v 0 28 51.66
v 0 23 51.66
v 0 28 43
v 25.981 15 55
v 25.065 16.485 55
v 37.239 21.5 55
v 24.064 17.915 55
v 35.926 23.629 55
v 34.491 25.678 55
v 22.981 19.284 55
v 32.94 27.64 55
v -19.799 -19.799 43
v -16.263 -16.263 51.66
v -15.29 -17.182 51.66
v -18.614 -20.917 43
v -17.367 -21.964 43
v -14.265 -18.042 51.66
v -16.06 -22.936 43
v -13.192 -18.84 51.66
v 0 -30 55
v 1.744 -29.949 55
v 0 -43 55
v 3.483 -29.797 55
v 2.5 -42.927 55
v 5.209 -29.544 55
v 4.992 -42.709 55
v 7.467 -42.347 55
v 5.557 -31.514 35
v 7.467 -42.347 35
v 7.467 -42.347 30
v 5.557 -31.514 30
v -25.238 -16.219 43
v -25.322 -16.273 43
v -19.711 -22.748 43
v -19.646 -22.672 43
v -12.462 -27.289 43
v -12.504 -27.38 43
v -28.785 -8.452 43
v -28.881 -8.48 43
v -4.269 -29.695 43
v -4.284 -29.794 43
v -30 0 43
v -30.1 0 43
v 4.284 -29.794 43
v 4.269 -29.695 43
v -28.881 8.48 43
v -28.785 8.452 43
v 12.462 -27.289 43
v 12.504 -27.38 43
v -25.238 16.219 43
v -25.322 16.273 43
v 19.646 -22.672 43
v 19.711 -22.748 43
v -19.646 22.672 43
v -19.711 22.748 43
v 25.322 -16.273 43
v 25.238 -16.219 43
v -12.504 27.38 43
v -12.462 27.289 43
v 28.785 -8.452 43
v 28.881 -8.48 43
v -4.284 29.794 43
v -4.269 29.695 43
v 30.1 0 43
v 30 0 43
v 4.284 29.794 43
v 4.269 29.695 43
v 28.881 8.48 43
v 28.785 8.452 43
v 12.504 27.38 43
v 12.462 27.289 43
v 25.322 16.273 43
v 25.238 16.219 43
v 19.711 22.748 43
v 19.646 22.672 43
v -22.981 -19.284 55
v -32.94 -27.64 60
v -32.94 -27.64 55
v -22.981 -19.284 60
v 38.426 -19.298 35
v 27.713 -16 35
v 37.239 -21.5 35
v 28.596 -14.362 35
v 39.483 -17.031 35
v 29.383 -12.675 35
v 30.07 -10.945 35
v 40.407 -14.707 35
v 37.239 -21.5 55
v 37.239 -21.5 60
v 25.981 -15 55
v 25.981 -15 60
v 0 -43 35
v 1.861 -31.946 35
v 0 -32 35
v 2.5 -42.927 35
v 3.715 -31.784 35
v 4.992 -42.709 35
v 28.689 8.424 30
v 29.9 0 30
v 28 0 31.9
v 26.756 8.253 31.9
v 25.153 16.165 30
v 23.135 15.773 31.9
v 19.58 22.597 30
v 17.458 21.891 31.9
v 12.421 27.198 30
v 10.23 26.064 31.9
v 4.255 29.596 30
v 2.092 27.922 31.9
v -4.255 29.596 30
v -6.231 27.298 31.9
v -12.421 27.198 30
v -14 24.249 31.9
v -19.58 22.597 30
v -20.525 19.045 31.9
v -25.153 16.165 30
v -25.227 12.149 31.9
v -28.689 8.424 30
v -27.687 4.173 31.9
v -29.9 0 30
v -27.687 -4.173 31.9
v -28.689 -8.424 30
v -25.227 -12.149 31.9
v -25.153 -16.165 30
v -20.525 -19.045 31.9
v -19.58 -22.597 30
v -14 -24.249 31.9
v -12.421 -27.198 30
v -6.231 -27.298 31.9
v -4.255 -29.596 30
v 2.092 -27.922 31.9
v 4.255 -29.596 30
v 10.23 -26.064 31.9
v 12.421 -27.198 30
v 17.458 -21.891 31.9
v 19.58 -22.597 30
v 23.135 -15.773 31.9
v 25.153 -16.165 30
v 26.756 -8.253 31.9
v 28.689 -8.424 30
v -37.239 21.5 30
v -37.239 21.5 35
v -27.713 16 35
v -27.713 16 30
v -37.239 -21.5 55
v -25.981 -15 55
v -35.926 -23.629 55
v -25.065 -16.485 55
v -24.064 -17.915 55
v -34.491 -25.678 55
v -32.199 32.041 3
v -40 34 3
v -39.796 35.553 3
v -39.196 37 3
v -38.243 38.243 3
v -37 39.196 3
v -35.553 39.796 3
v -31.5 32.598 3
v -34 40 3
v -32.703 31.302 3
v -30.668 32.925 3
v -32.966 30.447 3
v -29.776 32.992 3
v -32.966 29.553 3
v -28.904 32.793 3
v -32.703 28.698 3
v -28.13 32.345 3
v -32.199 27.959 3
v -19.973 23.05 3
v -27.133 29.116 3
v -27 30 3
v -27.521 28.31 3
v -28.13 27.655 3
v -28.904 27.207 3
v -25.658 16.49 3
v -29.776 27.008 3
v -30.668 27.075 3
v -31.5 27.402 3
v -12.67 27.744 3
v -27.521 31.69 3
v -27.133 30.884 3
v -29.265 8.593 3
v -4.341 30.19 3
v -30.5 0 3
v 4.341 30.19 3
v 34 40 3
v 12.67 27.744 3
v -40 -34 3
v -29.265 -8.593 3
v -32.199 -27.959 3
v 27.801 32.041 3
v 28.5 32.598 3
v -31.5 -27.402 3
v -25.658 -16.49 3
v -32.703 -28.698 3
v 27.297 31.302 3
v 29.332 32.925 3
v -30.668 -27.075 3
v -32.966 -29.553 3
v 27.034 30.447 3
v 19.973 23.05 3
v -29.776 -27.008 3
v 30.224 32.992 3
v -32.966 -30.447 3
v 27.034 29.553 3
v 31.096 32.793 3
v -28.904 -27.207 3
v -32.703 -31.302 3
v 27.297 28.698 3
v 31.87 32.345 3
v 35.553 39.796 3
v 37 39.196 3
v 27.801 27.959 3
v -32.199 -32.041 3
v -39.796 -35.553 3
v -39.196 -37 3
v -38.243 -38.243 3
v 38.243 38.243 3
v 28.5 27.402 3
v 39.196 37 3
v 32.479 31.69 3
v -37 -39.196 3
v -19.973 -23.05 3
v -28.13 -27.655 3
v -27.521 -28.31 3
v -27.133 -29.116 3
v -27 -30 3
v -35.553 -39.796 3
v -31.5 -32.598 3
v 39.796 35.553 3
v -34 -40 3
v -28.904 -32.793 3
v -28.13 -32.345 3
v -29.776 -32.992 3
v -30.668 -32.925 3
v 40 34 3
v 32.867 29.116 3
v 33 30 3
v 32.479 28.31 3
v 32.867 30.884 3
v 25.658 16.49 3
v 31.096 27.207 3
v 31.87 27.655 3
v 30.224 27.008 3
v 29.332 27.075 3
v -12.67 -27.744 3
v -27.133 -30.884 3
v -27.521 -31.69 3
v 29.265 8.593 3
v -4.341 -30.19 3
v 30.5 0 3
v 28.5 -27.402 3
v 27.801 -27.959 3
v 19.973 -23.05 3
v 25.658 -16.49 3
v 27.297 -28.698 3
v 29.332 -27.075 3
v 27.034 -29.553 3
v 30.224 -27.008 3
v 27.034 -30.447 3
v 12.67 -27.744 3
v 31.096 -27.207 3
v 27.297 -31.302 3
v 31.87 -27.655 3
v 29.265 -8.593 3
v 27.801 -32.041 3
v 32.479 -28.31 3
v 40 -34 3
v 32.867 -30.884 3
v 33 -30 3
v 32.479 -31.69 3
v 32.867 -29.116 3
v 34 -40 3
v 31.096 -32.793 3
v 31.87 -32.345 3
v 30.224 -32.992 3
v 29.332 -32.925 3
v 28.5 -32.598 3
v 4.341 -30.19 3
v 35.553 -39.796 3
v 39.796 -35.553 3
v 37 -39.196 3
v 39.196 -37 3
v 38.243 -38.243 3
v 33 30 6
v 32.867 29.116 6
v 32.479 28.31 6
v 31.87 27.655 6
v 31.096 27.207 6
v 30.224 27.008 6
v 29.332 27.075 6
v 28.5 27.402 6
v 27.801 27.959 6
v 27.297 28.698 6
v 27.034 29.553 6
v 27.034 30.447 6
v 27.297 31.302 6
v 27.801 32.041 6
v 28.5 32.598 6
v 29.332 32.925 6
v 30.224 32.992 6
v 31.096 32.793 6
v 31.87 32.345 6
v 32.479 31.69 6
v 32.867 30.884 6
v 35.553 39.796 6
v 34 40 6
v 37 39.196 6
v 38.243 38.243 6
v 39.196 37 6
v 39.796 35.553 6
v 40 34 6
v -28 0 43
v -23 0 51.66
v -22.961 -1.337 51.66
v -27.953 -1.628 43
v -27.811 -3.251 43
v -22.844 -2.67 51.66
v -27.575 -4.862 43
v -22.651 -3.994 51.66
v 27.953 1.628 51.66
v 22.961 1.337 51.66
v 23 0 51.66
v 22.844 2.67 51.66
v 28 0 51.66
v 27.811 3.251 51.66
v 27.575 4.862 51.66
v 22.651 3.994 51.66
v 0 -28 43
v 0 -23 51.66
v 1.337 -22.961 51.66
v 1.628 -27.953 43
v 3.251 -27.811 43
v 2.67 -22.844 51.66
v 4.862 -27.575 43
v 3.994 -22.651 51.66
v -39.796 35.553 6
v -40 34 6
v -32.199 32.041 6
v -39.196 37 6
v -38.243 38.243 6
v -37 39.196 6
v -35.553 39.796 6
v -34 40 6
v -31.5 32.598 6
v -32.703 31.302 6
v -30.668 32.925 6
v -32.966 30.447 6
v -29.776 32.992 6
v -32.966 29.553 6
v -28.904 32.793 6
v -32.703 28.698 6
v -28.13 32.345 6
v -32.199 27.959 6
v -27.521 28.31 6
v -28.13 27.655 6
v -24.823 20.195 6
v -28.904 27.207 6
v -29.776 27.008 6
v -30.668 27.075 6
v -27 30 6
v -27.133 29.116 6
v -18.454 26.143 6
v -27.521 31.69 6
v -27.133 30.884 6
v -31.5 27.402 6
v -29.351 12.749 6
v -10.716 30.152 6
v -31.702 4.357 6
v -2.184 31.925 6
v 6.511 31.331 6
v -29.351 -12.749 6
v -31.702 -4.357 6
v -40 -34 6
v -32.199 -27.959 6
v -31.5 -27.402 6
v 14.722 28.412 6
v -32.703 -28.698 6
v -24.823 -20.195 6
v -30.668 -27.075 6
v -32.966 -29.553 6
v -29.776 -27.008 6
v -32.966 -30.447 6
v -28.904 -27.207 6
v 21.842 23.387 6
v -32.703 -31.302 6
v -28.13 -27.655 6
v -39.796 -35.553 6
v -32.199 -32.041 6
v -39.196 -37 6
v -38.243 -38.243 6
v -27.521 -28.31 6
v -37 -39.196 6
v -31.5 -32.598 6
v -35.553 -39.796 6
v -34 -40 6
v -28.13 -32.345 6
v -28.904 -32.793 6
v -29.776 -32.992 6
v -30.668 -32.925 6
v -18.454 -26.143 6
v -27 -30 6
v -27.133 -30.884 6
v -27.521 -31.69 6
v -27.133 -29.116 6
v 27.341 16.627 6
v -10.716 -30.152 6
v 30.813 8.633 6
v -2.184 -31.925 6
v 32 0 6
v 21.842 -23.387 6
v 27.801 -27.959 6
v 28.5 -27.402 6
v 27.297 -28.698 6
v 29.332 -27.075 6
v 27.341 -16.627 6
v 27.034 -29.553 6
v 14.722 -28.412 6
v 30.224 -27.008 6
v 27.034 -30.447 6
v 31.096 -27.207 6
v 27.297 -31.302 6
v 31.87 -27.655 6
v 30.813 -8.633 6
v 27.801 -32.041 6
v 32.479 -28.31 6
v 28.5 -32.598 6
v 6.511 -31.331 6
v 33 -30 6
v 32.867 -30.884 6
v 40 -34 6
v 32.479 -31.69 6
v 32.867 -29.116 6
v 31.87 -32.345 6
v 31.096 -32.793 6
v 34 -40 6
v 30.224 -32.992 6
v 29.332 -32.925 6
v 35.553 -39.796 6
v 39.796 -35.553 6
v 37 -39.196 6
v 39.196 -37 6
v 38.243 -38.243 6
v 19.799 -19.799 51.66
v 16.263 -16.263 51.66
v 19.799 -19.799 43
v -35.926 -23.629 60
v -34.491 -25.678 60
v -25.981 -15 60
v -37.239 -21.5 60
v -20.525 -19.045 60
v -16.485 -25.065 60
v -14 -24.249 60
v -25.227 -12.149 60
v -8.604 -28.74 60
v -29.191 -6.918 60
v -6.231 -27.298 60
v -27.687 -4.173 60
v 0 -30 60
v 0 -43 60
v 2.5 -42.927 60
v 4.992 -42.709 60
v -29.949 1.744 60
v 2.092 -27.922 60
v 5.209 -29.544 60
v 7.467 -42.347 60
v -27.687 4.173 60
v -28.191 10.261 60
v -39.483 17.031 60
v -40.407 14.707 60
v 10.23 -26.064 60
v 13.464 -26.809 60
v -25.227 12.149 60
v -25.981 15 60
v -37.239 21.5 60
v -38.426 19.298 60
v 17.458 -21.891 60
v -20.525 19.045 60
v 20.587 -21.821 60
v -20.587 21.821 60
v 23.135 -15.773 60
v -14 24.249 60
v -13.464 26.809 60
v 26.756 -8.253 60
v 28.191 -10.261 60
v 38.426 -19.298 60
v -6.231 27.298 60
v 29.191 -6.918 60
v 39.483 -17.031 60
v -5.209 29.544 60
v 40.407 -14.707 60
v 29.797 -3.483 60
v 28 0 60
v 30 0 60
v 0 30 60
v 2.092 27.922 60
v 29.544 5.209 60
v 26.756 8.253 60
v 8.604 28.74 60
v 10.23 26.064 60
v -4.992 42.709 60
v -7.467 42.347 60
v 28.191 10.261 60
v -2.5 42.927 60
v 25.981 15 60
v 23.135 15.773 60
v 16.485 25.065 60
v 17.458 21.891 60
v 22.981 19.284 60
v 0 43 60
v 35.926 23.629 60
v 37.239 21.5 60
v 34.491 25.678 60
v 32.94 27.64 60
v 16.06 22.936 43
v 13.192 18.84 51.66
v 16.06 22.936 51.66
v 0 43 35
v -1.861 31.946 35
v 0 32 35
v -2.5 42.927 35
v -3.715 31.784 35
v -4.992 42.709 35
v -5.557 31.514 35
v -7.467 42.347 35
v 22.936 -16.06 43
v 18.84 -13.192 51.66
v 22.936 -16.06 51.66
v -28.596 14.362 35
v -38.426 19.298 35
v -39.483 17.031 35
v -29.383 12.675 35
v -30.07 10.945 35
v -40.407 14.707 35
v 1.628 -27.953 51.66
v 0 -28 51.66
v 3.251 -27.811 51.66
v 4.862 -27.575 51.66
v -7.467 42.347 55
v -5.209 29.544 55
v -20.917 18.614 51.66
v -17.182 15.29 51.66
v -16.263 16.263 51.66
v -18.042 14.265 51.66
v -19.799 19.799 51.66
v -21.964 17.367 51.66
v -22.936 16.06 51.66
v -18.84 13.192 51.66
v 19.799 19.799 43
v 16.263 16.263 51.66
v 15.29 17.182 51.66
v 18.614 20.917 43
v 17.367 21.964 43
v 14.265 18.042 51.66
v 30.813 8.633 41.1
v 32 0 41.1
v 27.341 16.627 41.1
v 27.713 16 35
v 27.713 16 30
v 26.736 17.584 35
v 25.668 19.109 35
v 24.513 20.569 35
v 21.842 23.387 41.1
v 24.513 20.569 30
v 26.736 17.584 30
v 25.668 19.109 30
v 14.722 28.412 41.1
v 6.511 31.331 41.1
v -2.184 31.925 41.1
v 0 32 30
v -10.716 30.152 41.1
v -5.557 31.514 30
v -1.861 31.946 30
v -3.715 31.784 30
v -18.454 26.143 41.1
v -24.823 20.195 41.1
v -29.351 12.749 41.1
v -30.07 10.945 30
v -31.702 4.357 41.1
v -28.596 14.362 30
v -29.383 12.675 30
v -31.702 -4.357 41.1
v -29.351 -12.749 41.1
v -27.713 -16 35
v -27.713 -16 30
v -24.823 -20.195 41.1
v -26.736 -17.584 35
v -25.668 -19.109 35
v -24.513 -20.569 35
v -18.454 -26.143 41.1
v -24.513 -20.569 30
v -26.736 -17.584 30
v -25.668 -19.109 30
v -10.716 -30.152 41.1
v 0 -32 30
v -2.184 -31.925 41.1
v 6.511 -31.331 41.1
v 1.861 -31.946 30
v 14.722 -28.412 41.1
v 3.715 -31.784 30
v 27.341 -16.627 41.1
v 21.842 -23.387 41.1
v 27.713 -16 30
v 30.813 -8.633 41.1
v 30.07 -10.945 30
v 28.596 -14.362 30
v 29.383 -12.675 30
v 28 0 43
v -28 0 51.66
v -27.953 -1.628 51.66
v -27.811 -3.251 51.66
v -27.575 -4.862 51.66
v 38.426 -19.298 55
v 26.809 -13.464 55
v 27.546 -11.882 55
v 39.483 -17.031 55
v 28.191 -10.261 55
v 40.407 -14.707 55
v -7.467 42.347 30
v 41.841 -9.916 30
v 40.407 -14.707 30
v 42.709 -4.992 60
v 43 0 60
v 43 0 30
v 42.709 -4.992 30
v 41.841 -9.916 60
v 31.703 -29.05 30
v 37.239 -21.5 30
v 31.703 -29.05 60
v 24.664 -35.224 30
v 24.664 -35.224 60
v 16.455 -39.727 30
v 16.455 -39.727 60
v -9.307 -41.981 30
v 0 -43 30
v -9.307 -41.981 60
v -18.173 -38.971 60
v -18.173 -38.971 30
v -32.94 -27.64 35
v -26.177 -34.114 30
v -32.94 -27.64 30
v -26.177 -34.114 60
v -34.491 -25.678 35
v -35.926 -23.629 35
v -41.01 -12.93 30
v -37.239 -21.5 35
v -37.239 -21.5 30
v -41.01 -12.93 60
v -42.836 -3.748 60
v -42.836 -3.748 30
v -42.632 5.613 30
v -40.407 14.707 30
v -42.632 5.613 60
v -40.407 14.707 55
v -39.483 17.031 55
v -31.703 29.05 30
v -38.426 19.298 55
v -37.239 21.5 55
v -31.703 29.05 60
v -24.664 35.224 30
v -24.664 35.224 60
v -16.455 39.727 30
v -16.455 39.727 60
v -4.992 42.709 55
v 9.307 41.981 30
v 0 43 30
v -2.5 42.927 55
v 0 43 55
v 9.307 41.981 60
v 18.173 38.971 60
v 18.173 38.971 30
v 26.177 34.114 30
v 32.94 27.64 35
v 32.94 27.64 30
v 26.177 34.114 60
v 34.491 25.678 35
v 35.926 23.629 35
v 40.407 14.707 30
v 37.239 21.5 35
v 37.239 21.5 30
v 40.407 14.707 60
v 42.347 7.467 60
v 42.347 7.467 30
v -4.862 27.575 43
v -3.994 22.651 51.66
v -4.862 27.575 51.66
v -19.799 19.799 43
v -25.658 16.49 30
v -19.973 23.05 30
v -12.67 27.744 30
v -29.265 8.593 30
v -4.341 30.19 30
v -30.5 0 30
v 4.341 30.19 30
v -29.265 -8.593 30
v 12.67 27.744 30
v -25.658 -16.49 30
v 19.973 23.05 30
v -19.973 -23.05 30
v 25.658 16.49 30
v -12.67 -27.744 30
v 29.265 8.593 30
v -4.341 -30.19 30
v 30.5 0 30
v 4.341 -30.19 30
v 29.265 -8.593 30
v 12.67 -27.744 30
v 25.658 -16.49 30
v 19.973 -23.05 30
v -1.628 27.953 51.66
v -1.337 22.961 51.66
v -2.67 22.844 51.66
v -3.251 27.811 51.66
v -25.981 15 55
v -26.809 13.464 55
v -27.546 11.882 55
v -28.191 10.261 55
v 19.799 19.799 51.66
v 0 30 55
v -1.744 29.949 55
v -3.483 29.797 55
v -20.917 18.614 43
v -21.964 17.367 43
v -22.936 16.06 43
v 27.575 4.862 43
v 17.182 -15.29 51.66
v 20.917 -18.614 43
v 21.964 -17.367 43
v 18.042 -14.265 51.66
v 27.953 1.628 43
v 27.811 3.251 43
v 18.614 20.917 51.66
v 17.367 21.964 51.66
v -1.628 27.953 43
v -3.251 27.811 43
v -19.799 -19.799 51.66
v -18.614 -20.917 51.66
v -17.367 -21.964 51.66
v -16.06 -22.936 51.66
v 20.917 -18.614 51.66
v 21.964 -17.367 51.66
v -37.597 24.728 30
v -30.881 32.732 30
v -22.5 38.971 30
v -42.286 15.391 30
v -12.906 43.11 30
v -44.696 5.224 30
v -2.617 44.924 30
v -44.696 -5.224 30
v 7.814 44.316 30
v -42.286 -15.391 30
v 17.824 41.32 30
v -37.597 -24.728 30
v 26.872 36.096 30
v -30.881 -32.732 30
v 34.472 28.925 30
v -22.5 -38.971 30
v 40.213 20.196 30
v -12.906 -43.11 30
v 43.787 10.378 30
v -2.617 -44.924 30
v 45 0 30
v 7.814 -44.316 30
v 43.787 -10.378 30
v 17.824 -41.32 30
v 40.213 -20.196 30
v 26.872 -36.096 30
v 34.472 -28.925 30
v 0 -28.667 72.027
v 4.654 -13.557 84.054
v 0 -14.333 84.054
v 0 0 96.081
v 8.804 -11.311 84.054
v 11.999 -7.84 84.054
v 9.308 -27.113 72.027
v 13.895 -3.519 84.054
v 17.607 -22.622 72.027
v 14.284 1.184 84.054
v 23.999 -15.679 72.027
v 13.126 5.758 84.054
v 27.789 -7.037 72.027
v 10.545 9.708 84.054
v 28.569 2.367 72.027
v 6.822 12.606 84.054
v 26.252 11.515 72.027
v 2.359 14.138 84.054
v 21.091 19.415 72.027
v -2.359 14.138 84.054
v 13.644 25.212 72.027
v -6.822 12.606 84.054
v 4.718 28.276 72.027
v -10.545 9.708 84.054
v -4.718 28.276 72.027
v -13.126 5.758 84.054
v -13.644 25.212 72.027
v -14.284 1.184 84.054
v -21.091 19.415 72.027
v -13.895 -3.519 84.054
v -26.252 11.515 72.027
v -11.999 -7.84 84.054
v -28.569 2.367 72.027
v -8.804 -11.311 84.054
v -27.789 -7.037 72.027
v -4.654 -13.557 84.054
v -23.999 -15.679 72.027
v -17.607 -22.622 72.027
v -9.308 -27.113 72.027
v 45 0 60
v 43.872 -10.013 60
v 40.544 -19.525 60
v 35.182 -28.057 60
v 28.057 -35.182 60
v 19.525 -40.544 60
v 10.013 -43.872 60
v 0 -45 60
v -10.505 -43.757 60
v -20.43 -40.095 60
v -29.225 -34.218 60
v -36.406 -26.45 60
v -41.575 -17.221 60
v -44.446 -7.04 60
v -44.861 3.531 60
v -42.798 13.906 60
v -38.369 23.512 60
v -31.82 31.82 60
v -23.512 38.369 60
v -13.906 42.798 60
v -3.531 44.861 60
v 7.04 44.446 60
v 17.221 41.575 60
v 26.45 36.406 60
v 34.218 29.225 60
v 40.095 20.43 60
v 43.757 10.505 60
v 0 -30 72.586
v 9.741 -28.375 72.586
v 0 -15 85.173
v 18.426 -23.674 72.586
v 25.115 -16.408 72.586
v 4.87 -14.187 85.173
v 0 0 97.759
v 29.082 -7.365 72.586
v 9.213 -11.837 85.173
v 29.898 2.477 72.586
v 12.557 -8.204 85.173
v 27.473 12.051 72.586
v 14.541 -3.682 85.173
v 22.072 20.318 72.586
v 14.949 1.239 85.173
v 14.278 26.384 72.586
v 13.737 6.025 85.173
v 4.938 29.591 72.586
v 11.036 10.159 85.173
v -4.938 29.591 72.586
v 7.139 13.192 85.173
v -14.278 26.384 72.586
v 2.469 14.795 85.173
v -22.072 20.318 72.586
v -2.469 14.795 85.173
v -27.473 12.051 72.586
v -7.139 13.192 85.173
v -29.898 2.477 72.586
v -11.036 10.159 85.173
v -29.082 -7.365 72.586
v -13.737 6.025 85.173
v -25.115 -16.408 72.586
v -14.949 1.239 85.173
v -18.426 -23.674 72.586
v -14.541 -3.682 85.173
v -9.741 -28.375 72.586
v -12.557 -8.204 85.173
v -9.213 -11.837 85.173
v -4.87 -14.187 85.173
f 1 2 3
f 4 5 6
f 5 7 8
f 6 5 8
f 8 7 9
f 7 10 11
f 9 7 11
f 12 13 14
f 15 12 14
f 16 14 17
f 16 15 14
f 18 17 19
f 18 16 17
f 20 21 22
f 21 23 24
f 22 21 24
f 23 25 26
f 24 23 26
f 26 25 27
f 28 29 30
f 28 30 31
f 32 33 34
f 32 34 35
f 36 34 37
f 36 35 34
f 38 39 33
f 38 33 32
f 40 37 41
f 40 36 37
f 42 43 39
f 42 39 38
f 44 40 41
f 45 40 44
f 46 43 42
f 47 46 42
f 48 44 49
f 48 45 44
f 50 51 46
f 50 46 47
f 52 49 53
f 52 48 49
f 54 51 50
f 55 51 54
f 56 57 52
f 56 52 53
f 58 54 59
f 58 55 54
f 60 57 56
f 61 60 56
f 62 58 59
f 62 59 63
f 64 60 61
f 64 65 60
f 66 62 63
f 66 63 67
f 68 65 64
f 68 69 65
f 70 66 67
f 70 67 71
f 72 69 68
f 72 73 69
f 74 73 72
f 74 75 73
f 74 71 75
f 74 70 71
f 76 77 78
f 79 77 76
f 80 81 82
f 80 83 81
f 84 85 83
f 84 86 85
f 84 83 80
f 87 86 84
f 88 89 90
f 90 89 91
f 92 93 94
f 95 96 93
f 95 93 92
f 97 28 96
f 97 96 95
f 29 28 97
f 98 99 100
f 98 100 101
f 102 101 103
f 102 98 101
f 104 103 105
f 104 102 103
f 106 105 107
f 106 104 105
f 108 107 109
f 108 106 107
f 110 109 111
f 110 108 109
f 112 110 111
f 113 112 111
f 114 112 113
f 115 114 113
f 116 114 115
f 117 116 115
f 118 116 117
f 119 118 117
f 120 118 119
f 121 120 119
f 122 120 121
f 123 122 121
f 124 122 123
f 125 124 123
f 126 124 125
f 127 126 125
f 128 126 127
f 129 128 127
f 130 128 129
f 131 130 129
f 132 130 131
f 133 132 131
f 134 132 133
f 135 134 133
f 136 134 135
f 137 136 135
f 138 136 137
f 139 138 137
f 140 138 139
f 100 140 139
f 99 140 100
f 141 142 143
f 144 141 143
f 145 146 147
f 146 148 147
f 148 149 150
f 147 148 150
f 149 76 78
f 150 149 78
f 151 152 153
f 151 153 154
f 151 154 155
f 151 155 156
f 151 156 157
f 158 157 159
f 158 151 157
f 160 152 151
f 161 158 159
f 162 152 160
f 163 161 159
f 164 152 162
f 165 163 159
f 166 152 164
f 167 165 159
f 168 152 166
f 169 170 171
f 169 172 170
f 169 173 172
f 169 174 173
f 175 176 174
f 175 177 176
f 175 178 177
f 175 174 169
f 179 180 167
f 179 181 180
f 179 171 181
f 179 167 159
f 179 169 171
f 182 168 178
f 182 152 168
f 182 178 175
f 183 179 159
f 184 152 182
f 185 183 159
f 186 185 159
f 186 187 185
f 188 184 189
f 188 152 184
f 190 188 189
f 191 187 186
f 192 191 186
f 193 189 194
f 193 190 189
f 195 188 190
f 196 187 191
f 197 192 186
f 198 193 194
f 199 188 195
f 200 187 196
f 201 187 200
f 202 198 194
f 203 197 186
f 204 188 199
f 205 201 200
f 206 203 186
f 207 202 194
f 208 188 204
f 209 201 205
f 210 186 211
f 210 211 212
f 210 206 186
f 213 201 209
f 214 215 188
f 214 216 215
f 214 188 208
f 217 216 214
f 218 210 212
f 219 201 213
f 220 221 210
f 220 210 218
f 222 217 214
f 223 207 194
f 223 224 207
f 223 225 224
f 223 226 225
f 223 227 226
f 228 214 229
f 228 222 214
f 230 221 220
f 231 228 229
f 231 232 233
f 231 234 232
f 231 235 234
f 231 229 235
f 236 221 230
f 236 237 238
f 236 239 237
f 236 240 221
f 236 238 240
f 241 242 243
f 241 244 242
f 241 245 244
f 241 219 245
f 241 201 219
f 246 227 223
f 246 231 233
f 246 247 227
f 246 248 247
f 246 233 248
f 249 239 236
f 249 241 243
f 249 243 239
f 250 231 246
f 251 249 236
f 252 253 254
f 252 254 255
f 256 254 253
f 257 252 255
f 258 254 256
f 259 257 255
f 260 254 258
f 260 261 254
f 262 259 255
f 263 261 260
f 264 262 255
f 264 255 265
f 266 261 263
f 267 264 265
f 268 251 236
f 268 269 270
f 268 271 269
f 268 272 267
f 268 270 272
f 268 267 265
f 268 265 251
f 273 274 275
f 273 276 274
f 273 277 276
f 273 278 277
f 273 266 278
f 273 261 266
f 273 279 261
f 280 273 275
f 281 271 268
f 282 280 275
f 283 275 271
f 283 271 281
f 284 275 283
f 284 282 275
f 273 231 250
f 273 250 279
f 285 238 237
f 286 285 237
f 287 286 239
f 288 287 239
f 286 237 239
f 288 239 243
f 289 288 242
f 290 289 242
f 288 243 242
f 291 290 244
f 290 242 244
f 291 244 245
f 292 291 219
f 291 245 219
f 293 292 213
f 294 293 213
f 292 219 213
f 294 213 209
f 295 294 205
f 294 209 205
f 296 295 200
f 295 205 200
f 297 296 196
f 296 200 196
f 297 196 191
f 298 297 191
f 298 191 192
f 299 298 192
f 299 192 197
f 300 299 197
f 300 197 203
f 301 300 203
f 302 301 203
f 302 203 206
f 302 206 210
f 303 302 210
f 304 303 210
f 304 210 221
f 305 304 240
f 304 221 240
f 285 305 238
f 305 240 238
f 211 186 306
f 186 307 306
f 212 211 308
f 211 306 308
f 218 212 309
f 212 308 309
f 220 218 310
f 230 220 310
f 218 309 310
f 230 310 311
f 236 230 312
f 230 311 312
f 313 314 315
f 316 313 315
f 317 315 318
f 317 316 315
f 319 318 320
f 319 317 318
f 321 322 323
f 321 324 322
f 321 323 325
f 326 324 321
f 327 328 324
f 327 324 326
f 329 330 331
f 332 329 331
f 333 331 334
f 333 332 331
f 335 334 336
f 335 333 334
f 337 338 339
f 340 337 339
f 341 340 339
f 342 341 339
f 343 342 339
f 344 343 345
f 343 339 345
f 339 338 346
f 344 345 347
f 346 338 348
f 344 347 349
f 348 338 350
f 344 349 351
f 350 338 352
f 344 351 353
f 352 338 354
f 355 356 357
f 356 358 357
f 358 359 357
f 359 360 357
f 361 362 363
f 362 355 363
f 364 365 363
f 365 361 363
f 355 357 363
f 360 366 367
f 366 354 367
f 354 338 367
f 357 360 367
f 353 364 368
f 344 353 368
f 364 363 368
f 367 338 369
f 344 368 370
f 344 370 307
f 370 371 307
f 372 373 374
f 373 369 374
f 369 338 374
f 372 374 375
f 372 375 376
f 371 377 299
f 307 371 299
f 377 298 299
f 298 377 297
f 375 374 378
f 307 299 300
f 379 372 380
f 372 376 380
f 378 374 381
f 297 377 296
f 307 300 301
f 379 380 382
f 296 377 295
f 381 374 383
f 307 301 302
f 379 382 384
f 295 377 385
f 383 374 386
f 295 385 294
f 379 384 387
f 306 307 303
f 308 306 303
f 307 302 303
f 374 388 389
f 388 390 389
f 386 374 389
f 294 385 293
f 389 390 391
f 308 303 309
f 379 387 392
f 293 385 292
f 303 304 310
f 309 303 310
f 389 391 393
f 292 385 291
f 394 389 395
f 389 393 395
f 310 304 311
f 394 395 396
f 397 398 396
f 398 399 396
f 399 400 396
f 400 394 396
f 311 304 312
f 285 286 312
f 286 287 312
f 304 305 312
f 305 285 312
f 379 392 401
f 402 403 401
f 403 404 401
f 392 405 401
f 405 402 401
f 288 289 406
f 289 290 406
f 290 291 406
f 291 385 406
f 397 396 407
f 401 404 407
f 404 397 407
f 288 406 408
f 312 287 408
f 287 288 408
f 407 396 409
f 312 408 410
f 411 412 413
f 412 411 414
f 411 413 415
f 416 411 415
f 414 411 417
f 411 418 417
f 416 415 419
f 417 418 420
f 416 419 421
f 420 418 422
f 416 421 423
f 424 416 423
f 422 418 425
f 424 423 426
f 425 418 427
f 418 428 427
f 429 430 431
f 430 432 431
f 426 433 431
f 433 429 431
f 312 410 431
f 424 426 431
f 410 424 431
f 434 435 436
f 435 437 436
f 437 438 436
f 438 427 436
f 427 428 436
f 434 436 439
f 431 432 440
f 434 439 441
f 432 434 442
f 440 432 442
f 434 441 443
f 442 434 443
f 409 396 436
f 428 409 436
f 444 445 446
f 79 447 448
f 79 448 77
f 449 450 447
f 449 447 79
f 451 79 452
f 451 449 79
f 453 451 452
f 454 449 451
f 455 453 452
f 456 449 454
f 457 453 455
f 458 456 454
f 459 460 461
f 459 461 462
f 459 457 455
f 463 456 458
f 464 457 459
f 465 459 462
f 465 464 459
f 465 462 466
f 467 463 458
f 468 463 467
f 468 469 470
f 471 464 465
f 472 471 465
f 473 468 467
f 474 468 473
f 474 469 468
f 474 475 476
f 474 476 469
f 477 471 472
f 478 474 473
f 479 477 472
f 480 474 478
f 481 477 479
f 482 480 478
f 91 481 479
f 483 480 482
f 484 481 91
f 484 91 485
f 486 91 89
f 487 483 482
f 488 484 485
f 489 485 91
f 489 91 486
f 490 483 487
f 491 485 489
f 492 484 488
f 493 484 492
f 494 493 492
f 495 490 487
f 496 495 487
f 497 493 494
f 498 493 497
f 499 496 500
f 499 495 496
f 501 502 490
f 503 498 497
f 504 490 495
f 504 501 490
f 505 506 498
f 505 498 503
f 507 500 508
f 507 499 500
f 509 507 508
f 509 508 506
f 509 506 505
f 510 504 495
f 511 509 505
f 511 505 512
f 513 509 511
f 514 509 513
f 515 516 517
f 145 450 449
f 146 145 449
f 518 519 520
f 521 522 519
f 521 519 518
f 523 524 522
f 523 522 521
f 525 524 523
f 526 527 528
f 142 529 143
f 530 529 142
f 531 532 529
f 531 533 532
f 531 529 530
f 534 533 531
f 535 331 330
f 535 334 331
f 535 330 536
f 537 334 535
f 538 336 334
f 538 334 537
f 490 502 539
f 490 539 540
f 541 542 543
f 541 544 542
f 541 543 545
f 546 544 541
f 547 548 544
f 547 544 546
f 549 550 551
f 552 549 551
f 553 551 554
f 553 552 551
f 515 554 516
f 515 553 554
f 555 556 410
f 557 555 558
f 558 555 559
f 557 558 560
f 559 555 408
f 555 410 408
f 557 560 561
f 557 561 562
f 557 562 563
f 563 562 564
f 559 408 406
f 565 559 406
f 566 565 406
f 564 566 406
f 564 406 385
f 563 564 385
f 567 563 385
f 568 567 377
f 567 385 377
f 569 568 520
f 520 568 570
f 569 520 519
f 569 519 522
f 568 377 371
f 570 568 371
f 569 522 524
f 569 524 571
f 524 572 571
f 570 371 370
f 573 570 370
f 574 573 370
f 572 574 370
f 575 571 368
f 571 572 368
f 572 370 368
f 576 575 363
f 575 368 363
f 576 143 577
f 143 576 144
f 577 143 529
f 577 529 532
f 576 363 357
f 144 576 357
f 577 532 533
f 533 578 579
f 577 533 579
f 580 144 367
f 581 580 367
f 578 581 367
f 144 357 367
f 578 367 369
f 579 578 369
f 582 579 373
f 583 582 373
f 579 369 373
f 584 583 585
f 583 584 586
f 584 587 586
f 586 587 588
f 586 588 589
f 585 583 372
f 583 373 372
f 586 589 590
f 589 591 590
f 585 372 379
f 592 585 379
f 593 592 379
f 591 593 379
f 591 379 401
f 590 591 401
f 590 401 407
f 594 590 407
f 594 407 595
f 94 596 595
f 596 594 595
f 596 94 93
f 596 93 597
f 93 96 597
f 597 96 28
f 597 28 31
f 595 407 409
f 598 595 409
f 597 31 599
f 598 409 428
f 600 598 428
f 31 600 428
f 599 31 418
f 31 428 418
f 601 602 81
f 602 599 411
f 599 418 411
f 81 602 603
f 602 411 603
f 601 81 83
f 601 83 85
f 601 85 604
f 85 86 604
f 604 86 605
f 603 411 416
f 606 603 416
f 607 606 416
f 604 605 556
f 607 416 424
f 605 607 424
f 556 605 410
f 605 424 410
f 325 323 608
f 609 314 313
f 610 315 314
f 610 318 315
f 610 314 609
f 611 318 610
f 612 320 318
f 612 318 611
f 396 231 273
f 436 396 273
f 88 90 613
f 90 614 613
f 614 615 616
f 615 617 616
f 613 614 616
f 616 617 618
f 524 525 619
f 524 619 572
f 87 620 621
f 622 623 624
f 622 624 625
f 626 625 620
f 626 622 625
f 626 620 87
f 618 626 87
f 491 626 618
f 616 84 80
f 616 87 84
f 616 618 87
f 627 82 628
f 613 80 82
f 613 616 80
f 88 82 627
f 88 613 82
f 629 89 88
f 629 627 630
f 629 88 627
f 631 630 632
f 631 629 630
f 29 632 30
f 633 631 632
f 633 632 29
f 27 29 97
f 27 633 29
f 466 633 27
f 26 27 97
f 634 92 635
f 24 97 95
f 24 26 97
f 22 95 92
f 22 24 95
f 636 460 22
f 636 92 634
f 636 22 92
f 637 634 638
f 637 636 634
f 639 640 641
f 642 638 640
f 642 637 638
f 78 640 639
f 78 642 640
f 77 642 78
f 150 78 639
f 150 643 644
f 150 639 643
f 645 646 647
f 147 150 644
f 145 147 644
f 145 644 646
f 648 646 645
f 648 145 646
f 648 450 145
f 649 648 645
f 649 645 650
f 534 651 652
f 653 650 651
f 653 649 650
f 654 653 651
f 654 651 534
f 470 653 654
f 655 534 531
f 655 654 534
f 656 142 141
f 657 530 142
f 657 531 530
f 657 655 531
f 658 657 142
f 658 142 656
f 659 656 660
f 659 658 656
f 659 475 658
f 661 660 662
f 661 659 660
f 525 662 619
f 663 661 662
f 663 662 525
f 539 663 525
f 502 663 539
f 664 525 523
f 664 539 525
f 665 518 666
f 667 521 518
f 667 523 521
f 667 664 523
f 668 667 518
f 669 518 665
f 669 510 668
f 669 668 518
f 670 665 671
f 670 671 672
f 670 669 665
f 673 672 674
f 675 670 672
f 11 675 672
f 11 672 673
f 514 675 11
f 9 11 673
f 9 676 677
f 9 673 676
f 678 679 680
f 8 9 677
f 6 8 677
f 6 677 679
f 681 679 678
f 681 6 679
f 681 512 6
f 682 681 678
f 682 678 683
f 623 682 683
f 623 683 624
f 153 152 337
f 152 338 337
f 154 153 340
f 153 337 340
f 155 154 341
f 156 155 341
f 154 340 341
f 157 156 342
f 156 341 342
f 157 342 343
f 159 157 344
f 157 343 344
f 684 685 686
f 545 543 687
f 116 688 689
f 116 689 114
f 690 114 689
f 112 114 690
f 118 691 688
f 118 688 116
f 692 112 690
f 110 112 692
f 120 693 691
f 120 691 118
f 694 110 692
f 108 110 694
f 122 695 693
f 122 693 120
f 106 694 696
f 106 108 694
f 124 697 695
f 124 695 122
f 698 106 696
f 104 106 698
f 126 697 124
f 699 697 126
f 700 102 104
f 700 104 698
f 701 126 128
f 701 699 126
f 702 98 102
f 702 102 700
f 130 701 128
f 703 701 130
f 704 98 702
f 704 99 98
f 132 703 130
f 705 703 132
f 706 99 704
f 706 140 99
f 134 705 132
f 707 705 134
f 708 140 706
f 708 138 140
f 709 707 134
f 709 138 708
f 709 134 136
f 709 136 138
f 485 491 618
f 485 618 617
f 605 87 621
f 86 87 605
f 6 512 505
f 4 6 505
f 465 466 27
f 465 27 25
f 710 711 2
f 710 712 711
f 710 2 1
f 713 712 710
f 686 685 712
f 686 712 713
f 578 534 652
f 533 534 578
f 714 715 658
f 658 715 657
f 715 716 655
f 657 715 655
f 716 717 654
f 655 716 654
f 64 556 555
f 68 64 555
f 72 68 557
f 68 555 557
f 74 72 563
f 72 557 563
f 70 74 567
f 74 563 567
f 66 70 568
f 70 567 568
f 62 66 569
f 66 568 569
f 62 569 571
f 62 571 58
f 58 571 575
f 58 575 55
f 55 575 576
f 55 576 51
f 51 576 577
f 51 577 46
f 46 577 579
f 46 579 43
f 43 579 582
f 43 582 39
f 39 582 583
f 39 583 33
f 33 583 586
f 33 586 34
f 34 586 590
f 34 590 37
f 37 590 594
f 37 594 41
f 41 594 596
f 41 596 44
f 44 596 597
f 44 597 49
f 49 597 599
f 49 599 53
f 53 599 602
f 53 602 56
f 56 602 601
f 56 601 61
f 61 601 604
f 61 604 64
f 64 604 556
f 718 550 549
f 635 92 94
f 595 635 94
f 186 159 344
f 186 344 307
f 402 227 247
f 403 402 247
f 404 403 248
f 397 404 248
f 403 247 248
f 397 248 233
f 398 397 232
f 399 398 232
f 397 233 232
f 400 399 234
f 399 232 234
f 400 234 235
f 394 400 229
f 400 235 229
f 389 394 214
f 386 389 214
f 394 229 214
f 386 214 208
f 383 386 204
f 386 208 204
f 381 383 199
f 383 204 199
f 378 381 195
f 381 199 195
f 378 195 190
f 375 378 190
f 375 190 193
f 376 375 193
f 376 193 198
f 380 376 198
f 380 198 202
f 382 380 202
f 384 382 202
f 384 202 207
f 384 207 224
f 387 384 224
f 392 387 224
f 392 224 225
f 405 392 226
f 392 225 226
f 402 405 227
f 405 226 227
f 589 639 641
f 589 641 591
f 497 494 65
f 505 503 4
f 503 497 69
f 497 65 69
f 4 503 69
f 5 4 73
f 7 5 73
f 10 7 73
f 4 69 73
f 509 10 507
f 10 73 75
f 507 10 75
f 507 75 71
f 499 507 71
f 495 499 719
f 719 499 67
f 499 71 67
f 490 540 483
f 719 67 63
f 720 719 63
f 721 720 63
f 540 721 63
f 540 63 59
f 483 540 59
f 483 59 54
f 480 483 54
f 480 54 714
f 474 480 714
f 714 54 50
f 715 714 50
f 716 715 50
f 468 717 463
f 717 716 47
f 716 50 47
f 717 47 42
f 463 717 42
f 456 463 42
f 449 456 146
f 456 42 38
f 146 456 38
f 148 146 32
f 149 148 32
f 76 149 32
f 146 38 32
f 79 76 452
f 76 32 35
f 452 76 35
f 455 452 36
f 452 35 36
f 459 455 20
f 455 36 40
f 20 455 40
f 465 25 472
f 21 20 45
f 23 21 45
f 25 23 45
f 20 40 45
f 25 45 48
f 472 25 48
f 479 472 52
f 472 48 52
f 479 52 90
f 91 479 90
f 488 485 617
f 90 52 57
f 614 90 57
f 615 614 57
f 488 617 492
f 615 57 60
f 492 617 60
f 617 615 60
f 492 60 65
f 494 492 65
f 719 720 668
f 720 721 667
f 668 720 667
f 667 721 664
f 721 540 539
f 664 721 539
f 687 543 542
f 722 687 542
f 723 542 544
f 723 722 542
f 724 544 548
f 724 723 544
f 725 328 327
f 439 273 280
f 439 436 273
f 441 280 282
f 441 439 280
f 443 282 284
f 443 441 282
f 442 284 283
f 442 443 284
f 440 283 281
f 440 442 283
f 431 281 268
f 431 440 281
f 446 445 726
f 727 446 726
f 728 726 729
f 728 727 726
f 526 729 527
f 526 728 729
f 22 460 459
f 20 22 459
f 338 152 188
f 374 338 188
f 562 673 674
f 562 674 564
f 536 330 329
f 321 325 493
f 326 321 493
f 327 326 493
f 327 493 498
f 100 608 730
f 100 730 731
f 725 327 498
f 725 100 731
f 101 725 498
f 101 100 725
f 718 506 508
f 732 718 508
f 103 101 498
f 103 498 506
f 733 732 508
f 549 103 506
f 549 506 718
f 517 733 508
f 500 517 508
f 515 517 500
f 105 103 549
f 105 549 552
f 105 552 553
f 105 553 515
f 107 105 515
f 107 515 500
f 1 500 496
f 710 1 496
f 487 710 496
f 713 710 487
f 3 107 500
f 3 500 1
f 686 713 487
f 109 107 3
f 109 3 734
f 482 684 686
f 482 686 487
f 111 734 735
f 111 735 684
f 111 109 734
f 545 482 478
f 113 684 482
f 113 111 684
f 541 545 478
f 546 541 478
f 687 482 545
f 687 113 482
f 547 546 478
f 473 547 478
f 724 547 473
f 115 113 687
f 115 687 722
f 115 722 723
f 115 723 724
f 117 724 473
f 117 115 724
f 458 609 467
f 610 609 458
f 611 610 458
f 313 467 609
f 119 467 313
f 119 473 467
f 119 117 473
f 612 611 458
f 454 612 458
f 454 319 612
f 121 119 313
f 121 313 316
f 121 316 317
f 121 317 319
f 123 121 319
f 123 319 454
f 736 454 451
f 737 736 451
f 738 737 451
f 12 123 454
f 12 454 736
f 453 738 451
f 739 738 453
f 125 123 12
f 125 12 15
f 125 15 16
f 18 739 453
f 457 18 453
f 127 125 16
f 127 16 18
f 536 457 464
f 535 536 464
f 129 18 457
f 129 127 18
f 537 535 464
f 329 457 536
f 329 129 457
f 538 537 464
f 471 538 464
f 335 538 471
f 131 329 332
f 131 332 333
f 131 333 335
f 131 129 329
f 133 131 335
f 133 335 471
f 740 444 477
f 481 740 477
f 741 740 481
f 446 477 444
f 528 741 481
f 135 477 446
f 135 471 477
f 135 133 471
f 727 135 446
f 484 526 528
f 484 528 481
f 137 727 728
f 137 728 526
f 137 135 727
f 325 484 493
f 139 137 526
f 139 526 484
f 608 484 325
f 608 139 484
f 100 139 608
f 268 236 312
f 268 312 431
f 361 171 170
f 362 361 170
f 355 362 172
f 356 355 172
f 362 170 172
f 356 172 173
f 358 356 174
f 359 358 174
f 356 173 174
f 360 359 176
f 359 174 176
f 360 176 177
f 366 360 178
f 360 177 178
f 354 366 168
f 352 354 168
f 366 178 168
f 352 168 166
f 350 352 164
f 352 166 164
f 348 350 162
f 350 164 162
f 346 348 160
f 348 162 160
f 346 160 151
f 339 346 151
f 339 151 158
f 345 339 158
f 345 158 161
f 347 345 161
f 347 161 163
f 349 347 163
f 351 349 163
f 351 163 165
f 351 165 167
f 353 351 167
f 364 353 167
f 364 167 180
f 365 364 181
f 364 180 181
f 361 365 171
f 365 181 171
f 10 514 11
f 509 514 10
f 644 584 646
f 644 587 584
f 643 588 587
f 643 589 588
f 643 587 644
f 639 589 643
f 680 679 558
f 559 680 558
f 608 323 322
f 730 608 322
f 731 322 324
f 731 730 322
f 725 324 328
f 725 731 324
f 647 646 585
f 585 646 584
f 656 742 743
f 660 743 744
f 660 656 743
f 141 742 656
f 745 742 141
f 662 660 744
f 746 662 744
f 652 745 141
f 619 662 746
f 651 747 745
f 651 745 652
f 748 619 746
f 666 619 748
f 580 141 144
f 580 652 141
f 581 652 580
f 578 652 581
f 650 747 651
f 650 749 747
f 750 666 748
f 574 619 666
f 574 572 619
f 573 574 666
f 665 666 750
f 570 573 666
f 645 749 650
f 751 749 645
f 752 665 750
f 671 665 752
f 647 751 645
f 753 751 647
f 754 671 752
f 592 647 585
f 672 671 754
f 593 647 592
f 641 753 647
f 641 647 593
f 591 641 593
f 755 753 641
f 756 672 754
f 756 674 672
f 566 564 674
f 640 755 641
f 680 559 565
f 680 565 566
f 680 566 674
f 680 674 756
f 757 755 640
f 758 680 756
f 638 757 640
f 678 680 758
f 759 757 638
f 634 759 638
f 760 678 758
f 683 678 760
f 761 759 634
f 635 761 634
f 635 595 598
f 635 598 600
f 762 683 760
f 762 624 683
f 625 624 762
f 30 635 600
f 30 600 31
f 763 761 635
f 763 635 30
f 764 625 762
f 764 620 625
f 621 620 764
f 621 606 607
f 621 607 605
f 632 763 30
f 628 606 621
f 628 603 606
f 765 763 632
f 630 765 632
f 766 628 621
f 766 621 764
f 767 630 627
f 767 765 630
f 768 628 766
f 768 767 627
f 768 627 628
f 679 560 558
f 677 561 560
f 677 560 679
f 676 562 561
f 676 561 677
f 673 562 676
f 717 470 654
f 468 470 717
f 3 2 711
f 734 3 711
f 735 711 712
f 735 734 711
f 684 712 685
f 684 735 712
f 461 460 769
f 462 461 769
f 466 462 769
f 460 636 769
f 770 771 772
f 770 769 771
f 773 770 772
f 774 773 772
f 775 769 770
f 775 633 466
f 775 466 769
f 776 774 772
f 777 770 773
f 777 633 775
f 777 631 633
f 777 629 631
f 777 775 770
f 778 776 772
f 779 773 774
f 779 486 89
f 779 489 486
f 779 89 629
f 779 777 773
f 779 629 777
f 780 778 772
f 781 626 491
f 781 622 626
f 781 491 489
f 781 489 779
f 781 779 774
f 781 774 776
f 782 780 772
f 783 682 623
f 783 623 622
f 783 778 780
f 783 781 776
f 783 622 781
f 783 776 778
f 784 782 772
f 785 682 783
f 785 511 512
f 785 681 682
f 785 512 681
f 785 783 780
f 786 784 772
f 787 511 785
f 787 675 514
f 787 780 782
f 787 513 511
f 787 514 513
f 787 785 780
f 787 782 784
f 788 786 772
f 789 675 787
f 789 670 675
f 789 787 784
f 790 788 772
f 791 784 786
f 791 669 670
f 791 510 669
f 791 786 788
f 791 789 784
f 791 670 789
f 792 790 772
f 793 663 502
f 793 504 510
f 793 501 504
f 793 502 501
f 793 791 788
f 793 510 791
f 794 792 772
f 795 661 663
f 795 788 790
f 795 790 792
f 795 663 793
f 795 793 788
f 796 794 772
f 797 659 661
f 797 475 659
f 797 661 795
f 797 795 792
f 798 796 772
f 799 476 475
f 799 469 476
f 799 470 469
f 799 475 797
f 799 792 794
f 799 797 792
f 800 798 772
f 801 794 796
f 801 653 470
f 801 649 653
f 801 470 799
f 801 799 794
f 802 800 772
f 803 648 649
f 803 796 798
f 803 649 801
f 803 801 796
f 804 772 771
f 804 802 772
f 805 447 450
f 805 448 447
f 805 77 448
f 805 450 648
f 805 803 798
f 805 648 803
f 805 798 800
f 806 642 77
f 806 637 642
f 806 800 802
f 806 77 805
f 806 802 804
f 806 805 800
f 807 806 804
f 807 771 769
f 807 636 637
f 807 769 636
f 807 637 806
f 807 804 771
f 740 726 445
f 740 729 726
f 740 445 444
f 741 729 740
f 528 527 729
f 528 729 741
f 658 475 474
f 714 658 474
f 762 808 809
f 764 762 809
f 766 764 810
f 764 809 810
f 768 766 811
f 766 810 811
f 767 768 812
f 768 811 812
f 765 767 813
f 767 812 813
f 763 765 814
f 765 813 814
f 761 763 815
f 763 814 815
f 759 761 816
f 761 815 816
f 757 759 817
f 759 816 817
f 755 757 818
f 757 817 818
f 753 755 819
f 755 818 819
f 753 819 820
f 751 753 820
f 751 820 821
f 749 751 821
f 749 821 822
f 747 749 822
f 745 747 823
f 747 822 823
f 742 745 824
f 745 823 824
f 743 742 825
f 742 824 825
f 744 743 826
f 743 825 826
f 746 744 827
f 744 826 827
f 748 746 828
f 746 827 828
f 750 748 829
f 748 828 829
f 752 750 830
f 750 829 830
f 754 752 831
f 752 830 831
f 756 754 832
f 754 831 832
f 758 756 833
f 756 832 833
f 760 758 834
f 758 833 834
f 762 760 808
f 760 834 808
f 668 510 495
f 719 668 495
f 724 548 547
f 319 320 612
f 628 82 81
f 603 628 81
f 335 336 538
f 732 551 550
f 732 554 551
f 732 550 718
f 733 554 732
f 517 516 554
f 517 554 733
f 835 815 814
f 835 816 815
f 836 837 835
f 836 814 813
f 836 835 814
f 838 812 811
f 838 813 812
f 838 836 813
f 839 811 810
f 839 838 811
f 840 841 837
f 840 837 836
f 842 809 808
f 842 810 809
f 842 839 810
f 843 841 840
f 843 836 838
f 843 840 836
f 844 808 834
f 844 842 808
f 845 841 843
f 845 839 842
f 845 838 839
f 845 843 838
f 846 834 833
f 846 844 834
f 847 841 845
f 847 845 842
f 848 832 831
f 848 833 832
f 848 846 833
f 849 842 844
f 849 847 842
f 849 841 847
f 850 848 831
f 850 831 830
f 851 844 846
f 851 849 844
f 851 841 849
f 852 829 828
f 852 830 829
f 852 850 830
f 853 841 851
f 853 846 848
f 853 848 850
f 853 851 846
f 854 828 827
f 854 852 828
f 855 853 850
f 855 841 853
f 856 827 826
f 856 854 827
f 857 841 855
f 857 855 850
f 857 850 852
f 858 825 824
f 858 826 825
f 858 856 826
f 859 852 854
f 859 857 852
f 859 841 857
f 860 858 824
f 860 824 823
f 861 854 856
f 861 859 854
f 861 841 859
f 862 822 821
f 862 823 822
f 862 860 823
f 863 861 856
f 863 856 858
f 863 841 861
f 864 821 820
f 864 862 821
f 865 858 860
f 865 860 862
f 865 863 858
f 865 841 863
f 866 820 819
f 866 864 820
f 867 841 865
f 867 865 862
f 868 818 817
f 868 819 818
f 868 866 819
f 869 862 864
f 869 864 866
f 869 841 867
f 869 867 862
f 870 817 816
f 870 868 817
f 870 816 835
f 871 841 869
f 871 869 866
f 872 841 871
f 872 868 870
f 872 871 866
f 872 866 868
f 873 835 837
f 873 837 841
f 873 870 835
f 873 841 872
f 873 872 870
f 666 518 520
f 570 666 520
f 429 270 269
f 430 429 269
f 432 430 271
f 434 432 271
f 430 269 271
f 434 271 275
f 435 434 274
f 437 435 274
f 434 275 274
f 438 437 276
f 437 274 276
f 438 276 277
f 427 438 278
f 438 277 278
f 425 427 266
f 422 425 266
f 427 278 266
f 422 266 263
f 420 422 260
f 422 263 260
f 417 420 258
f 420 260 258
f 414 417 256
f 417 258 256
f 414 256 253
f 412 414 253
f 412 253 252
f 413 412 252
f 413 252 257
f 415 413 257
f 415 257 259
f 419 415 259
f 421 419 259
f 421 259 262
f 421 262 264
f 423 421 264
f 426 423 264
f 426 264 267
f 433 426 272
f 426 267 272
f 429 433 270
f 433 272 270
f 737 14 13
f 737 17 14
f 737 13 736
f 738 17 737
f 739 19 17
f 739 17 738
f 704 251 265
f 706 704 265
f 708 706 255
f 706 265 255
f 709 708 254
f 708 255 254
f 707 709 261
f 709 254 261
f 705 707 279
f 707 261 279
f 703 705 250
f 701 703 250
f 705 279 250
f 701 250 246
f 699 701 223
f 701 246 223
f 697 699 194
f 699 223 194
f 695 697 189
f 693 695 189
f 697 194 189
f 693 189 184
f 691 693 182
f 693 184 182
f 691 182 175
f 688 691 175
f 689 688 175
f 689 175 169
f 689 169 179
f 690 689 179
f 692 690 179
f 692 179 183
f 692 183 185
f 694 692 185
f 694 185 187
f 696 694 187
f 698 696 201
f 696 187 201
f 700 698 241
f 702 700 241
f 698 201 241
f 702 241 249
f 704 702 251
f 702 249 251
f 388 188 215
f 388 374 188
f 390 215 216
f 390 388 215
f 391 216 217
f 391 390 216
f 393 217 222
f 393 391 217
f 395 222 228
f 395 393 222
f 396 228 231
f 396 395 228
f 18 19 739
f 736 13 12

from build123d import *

# Parameters (mm, degrees)
SKETCH004_R           = 32
SKETCH004_R_2         = 30
PAD002_DEPTH          = 40
SKETCH005_R           = 30
SKETCH005_R_2         = 28
PAD003_DEPTH          = 30
CHAMFER_SIZE          = 1.9
CHAMFER001_SIZE       = 1.9
REVOLUTION_ANGLE      = 10
POLARPATTERN_COUNT    = 8
SKETCH007_W           = 15
SKETCH007_H           = 5
SKETCH007_W_2         = 13
REVOLUTION001_ANGLE   = 10
POLARPATTERN001_COUNT = 6
SKETCH009_R           = 45
SKETCH009_R_2         = 43
PAD004_DEPTH          = 30
SKETCH010_W           = 80
SKETCH010_H           = 80
SKETCH010_R           = 32
PAD005_DEPTH          = 3
SKETCH011_R           = 3
POCKET002_DEPTH       = 3
FILLET001_R           = 6
SKETCH021_R           = 30.5
POCKET004_DEPTH       = 27


with BuildPart() as part:
    # Sketch004 → Pad002 (new body)
    with BuildSketch(Plane.XY):
        Circle(SKETCH004_R)
        Circle(SKETCH004_R_2, mode=Mode.SUBTRACT)
    extrude(amount=PAD002_DEPTH)

    # Sketch005 (on Face4 of Pad002) → Pad003 (join)
    with BuildSketch(Plane.XY.offset(27)):
        Circle(SKETCH005_R)
        Circle(SKETCH005_R_2, mode=Mode.SUBTRACT)
    extrude(amount=PAD003_DEPTH)

    # Chamfer
    chamfer_edges = [part.edges().sort_by_distance(p)[0] for p in [
        (-32, 0, 40),
    ]]
    chamfer(chamfer_edges, length=CHAMFER_SIZE)

    # Chamfer001
    chamfer001_edges = [part.edges().sort_by_distance(p)[0] for p in [
        (-28, 0, 27),
    ]]
    chamfer(chamfer001_edges, length=CHAMFER001_SIZE)

    # Sketch006 → Revolution (revolve)
    with BuildSketch(Plane.YZ):
        Polygon((-28, 40), (-28, 48.660254), (-23, 48.660254), align=None)
    revolution = revolve(axis=Axis((0, 0, 0), (0, 0, 1)), revolution_arc=REVOLUTION_ANGLE)

    # PolarPattern: Revolution ×8 about axis
    polarpattern_axis = Axis((0, 0, 0), (0, 0, 1))
    for i in range(1, POLARPATTERN_COUNT):
        add(revolution.rotate(polarpattern_axis, i * 360 / POLARPATTERN_COUNT))

    # Sketch007 → Revolution001 (revolve)
    with BuildSketch(Plane.YZ):
        with Locations((-37.5, 54.5)):
            Rectangle(SKETCH007_W, SKETCH007_H)
        with Locations((-38.5, 29.5)):
            Rectangle(SKETCH007_W_2, SKETCH007_H)
    revolution001 = revolve(axis=Axis((0, 0, 0), (0, 0, 1)), revolution_arc=REVOLUTION001_ANGLE)

    # PolarPattern001: Revolution001 ×6 about axis
    polarpattern001_axis = Axis((0, 0, 0), (0, 0, 1))
    for i in range(1, POLARPATTERN001_COUNT):
        add(revolution001.rotate(polarpattern001_axis, i * 360 / POLARPATTERN001_COUNT))

    # Sketch008 → Revolution002 (revolve)
    with BuildSketch(Plane.YZ):
        Polygon((-45, 57), (0, 94.759483), (0, 93.081284), (-43, 57), align=None)
    revolve(axis=Axis((0, 0, 0), (0, 0, 1)))

    # Sketch009 (on Face100 of Revolution002) → Pad004 (join)
    with BuildSketch(Plane(origin=(0, 0, 57), x_dir=(1, 0, 0), z_dir=(0, 0, -1))):
        Circle(SKETCH009_R)
        Circle(SKETCH009_R_2, mode=Mode.SUBTRACT)
    extrude(amount=PAD004_DEPTH)

    # Sketch010 (on Face5 of Pad004) → Pad005 (join)
    with BuildSketch(Plane(origin=(0, 0, 0), x_dir=(1, 0, 0), z_dir=(0, 0, -1))):
        Rectangle(SKETCH010_W, SKETCH010_H)
        Circle(SKETCH010_R, mode=Mode.SUBTRACT)
    extrude(amount=-PAD005_DEPTH)

    # Sketch011 (on Face39 of Pad005) → Pocket002 (cut)
    with BuildSketch(Plane(origin=(0, 0, 0), x_dir=(1, 0, 0), z_dir=(0, 0, -1))):
        with Locations((-30, 30)):
            Circle(SKETCH011_R)
        with Locations((30, 30)):
            Circle(SKETCH011_R)
        with Locations((-30, -30)):
            Circle(SKETCH011_R)
        with Locations((30, -30)):
            Circle(SKETCH011_R)
    extrude(amount=-POCKET002_DEPTH, mode=Mode.SUBTRACT)

    # Fillet001
    fillet001_edges = [part.edges().sort_by_distance(p)[0] for p in [
        (40, 40, 1.5),
        (-40, 40, 1.5),
        (-40, -40, 1.5),
        (40, -40, 1.5),
    ]]
    fillet(fillet001_edges, radius=FILLET001_R)

    # Sketch021 (on Face1 of Fillet001) → Pocket004 (cut)
    with BuildSketch(Plane(origin=(0, 0, 0), x_dir=(1, 0, 0), z_dir=(0, 0, -1))):
        Circle(SKETCH021_R)
    extrude(amount=-POCKET004_DEPTH, mode=Mode.SUBTRACT)


with BuildPart() as part_1:
    # Body001 placement: moved
    add(part.part.moved(Location((0, 0, 3))))


solid = part_1.part
